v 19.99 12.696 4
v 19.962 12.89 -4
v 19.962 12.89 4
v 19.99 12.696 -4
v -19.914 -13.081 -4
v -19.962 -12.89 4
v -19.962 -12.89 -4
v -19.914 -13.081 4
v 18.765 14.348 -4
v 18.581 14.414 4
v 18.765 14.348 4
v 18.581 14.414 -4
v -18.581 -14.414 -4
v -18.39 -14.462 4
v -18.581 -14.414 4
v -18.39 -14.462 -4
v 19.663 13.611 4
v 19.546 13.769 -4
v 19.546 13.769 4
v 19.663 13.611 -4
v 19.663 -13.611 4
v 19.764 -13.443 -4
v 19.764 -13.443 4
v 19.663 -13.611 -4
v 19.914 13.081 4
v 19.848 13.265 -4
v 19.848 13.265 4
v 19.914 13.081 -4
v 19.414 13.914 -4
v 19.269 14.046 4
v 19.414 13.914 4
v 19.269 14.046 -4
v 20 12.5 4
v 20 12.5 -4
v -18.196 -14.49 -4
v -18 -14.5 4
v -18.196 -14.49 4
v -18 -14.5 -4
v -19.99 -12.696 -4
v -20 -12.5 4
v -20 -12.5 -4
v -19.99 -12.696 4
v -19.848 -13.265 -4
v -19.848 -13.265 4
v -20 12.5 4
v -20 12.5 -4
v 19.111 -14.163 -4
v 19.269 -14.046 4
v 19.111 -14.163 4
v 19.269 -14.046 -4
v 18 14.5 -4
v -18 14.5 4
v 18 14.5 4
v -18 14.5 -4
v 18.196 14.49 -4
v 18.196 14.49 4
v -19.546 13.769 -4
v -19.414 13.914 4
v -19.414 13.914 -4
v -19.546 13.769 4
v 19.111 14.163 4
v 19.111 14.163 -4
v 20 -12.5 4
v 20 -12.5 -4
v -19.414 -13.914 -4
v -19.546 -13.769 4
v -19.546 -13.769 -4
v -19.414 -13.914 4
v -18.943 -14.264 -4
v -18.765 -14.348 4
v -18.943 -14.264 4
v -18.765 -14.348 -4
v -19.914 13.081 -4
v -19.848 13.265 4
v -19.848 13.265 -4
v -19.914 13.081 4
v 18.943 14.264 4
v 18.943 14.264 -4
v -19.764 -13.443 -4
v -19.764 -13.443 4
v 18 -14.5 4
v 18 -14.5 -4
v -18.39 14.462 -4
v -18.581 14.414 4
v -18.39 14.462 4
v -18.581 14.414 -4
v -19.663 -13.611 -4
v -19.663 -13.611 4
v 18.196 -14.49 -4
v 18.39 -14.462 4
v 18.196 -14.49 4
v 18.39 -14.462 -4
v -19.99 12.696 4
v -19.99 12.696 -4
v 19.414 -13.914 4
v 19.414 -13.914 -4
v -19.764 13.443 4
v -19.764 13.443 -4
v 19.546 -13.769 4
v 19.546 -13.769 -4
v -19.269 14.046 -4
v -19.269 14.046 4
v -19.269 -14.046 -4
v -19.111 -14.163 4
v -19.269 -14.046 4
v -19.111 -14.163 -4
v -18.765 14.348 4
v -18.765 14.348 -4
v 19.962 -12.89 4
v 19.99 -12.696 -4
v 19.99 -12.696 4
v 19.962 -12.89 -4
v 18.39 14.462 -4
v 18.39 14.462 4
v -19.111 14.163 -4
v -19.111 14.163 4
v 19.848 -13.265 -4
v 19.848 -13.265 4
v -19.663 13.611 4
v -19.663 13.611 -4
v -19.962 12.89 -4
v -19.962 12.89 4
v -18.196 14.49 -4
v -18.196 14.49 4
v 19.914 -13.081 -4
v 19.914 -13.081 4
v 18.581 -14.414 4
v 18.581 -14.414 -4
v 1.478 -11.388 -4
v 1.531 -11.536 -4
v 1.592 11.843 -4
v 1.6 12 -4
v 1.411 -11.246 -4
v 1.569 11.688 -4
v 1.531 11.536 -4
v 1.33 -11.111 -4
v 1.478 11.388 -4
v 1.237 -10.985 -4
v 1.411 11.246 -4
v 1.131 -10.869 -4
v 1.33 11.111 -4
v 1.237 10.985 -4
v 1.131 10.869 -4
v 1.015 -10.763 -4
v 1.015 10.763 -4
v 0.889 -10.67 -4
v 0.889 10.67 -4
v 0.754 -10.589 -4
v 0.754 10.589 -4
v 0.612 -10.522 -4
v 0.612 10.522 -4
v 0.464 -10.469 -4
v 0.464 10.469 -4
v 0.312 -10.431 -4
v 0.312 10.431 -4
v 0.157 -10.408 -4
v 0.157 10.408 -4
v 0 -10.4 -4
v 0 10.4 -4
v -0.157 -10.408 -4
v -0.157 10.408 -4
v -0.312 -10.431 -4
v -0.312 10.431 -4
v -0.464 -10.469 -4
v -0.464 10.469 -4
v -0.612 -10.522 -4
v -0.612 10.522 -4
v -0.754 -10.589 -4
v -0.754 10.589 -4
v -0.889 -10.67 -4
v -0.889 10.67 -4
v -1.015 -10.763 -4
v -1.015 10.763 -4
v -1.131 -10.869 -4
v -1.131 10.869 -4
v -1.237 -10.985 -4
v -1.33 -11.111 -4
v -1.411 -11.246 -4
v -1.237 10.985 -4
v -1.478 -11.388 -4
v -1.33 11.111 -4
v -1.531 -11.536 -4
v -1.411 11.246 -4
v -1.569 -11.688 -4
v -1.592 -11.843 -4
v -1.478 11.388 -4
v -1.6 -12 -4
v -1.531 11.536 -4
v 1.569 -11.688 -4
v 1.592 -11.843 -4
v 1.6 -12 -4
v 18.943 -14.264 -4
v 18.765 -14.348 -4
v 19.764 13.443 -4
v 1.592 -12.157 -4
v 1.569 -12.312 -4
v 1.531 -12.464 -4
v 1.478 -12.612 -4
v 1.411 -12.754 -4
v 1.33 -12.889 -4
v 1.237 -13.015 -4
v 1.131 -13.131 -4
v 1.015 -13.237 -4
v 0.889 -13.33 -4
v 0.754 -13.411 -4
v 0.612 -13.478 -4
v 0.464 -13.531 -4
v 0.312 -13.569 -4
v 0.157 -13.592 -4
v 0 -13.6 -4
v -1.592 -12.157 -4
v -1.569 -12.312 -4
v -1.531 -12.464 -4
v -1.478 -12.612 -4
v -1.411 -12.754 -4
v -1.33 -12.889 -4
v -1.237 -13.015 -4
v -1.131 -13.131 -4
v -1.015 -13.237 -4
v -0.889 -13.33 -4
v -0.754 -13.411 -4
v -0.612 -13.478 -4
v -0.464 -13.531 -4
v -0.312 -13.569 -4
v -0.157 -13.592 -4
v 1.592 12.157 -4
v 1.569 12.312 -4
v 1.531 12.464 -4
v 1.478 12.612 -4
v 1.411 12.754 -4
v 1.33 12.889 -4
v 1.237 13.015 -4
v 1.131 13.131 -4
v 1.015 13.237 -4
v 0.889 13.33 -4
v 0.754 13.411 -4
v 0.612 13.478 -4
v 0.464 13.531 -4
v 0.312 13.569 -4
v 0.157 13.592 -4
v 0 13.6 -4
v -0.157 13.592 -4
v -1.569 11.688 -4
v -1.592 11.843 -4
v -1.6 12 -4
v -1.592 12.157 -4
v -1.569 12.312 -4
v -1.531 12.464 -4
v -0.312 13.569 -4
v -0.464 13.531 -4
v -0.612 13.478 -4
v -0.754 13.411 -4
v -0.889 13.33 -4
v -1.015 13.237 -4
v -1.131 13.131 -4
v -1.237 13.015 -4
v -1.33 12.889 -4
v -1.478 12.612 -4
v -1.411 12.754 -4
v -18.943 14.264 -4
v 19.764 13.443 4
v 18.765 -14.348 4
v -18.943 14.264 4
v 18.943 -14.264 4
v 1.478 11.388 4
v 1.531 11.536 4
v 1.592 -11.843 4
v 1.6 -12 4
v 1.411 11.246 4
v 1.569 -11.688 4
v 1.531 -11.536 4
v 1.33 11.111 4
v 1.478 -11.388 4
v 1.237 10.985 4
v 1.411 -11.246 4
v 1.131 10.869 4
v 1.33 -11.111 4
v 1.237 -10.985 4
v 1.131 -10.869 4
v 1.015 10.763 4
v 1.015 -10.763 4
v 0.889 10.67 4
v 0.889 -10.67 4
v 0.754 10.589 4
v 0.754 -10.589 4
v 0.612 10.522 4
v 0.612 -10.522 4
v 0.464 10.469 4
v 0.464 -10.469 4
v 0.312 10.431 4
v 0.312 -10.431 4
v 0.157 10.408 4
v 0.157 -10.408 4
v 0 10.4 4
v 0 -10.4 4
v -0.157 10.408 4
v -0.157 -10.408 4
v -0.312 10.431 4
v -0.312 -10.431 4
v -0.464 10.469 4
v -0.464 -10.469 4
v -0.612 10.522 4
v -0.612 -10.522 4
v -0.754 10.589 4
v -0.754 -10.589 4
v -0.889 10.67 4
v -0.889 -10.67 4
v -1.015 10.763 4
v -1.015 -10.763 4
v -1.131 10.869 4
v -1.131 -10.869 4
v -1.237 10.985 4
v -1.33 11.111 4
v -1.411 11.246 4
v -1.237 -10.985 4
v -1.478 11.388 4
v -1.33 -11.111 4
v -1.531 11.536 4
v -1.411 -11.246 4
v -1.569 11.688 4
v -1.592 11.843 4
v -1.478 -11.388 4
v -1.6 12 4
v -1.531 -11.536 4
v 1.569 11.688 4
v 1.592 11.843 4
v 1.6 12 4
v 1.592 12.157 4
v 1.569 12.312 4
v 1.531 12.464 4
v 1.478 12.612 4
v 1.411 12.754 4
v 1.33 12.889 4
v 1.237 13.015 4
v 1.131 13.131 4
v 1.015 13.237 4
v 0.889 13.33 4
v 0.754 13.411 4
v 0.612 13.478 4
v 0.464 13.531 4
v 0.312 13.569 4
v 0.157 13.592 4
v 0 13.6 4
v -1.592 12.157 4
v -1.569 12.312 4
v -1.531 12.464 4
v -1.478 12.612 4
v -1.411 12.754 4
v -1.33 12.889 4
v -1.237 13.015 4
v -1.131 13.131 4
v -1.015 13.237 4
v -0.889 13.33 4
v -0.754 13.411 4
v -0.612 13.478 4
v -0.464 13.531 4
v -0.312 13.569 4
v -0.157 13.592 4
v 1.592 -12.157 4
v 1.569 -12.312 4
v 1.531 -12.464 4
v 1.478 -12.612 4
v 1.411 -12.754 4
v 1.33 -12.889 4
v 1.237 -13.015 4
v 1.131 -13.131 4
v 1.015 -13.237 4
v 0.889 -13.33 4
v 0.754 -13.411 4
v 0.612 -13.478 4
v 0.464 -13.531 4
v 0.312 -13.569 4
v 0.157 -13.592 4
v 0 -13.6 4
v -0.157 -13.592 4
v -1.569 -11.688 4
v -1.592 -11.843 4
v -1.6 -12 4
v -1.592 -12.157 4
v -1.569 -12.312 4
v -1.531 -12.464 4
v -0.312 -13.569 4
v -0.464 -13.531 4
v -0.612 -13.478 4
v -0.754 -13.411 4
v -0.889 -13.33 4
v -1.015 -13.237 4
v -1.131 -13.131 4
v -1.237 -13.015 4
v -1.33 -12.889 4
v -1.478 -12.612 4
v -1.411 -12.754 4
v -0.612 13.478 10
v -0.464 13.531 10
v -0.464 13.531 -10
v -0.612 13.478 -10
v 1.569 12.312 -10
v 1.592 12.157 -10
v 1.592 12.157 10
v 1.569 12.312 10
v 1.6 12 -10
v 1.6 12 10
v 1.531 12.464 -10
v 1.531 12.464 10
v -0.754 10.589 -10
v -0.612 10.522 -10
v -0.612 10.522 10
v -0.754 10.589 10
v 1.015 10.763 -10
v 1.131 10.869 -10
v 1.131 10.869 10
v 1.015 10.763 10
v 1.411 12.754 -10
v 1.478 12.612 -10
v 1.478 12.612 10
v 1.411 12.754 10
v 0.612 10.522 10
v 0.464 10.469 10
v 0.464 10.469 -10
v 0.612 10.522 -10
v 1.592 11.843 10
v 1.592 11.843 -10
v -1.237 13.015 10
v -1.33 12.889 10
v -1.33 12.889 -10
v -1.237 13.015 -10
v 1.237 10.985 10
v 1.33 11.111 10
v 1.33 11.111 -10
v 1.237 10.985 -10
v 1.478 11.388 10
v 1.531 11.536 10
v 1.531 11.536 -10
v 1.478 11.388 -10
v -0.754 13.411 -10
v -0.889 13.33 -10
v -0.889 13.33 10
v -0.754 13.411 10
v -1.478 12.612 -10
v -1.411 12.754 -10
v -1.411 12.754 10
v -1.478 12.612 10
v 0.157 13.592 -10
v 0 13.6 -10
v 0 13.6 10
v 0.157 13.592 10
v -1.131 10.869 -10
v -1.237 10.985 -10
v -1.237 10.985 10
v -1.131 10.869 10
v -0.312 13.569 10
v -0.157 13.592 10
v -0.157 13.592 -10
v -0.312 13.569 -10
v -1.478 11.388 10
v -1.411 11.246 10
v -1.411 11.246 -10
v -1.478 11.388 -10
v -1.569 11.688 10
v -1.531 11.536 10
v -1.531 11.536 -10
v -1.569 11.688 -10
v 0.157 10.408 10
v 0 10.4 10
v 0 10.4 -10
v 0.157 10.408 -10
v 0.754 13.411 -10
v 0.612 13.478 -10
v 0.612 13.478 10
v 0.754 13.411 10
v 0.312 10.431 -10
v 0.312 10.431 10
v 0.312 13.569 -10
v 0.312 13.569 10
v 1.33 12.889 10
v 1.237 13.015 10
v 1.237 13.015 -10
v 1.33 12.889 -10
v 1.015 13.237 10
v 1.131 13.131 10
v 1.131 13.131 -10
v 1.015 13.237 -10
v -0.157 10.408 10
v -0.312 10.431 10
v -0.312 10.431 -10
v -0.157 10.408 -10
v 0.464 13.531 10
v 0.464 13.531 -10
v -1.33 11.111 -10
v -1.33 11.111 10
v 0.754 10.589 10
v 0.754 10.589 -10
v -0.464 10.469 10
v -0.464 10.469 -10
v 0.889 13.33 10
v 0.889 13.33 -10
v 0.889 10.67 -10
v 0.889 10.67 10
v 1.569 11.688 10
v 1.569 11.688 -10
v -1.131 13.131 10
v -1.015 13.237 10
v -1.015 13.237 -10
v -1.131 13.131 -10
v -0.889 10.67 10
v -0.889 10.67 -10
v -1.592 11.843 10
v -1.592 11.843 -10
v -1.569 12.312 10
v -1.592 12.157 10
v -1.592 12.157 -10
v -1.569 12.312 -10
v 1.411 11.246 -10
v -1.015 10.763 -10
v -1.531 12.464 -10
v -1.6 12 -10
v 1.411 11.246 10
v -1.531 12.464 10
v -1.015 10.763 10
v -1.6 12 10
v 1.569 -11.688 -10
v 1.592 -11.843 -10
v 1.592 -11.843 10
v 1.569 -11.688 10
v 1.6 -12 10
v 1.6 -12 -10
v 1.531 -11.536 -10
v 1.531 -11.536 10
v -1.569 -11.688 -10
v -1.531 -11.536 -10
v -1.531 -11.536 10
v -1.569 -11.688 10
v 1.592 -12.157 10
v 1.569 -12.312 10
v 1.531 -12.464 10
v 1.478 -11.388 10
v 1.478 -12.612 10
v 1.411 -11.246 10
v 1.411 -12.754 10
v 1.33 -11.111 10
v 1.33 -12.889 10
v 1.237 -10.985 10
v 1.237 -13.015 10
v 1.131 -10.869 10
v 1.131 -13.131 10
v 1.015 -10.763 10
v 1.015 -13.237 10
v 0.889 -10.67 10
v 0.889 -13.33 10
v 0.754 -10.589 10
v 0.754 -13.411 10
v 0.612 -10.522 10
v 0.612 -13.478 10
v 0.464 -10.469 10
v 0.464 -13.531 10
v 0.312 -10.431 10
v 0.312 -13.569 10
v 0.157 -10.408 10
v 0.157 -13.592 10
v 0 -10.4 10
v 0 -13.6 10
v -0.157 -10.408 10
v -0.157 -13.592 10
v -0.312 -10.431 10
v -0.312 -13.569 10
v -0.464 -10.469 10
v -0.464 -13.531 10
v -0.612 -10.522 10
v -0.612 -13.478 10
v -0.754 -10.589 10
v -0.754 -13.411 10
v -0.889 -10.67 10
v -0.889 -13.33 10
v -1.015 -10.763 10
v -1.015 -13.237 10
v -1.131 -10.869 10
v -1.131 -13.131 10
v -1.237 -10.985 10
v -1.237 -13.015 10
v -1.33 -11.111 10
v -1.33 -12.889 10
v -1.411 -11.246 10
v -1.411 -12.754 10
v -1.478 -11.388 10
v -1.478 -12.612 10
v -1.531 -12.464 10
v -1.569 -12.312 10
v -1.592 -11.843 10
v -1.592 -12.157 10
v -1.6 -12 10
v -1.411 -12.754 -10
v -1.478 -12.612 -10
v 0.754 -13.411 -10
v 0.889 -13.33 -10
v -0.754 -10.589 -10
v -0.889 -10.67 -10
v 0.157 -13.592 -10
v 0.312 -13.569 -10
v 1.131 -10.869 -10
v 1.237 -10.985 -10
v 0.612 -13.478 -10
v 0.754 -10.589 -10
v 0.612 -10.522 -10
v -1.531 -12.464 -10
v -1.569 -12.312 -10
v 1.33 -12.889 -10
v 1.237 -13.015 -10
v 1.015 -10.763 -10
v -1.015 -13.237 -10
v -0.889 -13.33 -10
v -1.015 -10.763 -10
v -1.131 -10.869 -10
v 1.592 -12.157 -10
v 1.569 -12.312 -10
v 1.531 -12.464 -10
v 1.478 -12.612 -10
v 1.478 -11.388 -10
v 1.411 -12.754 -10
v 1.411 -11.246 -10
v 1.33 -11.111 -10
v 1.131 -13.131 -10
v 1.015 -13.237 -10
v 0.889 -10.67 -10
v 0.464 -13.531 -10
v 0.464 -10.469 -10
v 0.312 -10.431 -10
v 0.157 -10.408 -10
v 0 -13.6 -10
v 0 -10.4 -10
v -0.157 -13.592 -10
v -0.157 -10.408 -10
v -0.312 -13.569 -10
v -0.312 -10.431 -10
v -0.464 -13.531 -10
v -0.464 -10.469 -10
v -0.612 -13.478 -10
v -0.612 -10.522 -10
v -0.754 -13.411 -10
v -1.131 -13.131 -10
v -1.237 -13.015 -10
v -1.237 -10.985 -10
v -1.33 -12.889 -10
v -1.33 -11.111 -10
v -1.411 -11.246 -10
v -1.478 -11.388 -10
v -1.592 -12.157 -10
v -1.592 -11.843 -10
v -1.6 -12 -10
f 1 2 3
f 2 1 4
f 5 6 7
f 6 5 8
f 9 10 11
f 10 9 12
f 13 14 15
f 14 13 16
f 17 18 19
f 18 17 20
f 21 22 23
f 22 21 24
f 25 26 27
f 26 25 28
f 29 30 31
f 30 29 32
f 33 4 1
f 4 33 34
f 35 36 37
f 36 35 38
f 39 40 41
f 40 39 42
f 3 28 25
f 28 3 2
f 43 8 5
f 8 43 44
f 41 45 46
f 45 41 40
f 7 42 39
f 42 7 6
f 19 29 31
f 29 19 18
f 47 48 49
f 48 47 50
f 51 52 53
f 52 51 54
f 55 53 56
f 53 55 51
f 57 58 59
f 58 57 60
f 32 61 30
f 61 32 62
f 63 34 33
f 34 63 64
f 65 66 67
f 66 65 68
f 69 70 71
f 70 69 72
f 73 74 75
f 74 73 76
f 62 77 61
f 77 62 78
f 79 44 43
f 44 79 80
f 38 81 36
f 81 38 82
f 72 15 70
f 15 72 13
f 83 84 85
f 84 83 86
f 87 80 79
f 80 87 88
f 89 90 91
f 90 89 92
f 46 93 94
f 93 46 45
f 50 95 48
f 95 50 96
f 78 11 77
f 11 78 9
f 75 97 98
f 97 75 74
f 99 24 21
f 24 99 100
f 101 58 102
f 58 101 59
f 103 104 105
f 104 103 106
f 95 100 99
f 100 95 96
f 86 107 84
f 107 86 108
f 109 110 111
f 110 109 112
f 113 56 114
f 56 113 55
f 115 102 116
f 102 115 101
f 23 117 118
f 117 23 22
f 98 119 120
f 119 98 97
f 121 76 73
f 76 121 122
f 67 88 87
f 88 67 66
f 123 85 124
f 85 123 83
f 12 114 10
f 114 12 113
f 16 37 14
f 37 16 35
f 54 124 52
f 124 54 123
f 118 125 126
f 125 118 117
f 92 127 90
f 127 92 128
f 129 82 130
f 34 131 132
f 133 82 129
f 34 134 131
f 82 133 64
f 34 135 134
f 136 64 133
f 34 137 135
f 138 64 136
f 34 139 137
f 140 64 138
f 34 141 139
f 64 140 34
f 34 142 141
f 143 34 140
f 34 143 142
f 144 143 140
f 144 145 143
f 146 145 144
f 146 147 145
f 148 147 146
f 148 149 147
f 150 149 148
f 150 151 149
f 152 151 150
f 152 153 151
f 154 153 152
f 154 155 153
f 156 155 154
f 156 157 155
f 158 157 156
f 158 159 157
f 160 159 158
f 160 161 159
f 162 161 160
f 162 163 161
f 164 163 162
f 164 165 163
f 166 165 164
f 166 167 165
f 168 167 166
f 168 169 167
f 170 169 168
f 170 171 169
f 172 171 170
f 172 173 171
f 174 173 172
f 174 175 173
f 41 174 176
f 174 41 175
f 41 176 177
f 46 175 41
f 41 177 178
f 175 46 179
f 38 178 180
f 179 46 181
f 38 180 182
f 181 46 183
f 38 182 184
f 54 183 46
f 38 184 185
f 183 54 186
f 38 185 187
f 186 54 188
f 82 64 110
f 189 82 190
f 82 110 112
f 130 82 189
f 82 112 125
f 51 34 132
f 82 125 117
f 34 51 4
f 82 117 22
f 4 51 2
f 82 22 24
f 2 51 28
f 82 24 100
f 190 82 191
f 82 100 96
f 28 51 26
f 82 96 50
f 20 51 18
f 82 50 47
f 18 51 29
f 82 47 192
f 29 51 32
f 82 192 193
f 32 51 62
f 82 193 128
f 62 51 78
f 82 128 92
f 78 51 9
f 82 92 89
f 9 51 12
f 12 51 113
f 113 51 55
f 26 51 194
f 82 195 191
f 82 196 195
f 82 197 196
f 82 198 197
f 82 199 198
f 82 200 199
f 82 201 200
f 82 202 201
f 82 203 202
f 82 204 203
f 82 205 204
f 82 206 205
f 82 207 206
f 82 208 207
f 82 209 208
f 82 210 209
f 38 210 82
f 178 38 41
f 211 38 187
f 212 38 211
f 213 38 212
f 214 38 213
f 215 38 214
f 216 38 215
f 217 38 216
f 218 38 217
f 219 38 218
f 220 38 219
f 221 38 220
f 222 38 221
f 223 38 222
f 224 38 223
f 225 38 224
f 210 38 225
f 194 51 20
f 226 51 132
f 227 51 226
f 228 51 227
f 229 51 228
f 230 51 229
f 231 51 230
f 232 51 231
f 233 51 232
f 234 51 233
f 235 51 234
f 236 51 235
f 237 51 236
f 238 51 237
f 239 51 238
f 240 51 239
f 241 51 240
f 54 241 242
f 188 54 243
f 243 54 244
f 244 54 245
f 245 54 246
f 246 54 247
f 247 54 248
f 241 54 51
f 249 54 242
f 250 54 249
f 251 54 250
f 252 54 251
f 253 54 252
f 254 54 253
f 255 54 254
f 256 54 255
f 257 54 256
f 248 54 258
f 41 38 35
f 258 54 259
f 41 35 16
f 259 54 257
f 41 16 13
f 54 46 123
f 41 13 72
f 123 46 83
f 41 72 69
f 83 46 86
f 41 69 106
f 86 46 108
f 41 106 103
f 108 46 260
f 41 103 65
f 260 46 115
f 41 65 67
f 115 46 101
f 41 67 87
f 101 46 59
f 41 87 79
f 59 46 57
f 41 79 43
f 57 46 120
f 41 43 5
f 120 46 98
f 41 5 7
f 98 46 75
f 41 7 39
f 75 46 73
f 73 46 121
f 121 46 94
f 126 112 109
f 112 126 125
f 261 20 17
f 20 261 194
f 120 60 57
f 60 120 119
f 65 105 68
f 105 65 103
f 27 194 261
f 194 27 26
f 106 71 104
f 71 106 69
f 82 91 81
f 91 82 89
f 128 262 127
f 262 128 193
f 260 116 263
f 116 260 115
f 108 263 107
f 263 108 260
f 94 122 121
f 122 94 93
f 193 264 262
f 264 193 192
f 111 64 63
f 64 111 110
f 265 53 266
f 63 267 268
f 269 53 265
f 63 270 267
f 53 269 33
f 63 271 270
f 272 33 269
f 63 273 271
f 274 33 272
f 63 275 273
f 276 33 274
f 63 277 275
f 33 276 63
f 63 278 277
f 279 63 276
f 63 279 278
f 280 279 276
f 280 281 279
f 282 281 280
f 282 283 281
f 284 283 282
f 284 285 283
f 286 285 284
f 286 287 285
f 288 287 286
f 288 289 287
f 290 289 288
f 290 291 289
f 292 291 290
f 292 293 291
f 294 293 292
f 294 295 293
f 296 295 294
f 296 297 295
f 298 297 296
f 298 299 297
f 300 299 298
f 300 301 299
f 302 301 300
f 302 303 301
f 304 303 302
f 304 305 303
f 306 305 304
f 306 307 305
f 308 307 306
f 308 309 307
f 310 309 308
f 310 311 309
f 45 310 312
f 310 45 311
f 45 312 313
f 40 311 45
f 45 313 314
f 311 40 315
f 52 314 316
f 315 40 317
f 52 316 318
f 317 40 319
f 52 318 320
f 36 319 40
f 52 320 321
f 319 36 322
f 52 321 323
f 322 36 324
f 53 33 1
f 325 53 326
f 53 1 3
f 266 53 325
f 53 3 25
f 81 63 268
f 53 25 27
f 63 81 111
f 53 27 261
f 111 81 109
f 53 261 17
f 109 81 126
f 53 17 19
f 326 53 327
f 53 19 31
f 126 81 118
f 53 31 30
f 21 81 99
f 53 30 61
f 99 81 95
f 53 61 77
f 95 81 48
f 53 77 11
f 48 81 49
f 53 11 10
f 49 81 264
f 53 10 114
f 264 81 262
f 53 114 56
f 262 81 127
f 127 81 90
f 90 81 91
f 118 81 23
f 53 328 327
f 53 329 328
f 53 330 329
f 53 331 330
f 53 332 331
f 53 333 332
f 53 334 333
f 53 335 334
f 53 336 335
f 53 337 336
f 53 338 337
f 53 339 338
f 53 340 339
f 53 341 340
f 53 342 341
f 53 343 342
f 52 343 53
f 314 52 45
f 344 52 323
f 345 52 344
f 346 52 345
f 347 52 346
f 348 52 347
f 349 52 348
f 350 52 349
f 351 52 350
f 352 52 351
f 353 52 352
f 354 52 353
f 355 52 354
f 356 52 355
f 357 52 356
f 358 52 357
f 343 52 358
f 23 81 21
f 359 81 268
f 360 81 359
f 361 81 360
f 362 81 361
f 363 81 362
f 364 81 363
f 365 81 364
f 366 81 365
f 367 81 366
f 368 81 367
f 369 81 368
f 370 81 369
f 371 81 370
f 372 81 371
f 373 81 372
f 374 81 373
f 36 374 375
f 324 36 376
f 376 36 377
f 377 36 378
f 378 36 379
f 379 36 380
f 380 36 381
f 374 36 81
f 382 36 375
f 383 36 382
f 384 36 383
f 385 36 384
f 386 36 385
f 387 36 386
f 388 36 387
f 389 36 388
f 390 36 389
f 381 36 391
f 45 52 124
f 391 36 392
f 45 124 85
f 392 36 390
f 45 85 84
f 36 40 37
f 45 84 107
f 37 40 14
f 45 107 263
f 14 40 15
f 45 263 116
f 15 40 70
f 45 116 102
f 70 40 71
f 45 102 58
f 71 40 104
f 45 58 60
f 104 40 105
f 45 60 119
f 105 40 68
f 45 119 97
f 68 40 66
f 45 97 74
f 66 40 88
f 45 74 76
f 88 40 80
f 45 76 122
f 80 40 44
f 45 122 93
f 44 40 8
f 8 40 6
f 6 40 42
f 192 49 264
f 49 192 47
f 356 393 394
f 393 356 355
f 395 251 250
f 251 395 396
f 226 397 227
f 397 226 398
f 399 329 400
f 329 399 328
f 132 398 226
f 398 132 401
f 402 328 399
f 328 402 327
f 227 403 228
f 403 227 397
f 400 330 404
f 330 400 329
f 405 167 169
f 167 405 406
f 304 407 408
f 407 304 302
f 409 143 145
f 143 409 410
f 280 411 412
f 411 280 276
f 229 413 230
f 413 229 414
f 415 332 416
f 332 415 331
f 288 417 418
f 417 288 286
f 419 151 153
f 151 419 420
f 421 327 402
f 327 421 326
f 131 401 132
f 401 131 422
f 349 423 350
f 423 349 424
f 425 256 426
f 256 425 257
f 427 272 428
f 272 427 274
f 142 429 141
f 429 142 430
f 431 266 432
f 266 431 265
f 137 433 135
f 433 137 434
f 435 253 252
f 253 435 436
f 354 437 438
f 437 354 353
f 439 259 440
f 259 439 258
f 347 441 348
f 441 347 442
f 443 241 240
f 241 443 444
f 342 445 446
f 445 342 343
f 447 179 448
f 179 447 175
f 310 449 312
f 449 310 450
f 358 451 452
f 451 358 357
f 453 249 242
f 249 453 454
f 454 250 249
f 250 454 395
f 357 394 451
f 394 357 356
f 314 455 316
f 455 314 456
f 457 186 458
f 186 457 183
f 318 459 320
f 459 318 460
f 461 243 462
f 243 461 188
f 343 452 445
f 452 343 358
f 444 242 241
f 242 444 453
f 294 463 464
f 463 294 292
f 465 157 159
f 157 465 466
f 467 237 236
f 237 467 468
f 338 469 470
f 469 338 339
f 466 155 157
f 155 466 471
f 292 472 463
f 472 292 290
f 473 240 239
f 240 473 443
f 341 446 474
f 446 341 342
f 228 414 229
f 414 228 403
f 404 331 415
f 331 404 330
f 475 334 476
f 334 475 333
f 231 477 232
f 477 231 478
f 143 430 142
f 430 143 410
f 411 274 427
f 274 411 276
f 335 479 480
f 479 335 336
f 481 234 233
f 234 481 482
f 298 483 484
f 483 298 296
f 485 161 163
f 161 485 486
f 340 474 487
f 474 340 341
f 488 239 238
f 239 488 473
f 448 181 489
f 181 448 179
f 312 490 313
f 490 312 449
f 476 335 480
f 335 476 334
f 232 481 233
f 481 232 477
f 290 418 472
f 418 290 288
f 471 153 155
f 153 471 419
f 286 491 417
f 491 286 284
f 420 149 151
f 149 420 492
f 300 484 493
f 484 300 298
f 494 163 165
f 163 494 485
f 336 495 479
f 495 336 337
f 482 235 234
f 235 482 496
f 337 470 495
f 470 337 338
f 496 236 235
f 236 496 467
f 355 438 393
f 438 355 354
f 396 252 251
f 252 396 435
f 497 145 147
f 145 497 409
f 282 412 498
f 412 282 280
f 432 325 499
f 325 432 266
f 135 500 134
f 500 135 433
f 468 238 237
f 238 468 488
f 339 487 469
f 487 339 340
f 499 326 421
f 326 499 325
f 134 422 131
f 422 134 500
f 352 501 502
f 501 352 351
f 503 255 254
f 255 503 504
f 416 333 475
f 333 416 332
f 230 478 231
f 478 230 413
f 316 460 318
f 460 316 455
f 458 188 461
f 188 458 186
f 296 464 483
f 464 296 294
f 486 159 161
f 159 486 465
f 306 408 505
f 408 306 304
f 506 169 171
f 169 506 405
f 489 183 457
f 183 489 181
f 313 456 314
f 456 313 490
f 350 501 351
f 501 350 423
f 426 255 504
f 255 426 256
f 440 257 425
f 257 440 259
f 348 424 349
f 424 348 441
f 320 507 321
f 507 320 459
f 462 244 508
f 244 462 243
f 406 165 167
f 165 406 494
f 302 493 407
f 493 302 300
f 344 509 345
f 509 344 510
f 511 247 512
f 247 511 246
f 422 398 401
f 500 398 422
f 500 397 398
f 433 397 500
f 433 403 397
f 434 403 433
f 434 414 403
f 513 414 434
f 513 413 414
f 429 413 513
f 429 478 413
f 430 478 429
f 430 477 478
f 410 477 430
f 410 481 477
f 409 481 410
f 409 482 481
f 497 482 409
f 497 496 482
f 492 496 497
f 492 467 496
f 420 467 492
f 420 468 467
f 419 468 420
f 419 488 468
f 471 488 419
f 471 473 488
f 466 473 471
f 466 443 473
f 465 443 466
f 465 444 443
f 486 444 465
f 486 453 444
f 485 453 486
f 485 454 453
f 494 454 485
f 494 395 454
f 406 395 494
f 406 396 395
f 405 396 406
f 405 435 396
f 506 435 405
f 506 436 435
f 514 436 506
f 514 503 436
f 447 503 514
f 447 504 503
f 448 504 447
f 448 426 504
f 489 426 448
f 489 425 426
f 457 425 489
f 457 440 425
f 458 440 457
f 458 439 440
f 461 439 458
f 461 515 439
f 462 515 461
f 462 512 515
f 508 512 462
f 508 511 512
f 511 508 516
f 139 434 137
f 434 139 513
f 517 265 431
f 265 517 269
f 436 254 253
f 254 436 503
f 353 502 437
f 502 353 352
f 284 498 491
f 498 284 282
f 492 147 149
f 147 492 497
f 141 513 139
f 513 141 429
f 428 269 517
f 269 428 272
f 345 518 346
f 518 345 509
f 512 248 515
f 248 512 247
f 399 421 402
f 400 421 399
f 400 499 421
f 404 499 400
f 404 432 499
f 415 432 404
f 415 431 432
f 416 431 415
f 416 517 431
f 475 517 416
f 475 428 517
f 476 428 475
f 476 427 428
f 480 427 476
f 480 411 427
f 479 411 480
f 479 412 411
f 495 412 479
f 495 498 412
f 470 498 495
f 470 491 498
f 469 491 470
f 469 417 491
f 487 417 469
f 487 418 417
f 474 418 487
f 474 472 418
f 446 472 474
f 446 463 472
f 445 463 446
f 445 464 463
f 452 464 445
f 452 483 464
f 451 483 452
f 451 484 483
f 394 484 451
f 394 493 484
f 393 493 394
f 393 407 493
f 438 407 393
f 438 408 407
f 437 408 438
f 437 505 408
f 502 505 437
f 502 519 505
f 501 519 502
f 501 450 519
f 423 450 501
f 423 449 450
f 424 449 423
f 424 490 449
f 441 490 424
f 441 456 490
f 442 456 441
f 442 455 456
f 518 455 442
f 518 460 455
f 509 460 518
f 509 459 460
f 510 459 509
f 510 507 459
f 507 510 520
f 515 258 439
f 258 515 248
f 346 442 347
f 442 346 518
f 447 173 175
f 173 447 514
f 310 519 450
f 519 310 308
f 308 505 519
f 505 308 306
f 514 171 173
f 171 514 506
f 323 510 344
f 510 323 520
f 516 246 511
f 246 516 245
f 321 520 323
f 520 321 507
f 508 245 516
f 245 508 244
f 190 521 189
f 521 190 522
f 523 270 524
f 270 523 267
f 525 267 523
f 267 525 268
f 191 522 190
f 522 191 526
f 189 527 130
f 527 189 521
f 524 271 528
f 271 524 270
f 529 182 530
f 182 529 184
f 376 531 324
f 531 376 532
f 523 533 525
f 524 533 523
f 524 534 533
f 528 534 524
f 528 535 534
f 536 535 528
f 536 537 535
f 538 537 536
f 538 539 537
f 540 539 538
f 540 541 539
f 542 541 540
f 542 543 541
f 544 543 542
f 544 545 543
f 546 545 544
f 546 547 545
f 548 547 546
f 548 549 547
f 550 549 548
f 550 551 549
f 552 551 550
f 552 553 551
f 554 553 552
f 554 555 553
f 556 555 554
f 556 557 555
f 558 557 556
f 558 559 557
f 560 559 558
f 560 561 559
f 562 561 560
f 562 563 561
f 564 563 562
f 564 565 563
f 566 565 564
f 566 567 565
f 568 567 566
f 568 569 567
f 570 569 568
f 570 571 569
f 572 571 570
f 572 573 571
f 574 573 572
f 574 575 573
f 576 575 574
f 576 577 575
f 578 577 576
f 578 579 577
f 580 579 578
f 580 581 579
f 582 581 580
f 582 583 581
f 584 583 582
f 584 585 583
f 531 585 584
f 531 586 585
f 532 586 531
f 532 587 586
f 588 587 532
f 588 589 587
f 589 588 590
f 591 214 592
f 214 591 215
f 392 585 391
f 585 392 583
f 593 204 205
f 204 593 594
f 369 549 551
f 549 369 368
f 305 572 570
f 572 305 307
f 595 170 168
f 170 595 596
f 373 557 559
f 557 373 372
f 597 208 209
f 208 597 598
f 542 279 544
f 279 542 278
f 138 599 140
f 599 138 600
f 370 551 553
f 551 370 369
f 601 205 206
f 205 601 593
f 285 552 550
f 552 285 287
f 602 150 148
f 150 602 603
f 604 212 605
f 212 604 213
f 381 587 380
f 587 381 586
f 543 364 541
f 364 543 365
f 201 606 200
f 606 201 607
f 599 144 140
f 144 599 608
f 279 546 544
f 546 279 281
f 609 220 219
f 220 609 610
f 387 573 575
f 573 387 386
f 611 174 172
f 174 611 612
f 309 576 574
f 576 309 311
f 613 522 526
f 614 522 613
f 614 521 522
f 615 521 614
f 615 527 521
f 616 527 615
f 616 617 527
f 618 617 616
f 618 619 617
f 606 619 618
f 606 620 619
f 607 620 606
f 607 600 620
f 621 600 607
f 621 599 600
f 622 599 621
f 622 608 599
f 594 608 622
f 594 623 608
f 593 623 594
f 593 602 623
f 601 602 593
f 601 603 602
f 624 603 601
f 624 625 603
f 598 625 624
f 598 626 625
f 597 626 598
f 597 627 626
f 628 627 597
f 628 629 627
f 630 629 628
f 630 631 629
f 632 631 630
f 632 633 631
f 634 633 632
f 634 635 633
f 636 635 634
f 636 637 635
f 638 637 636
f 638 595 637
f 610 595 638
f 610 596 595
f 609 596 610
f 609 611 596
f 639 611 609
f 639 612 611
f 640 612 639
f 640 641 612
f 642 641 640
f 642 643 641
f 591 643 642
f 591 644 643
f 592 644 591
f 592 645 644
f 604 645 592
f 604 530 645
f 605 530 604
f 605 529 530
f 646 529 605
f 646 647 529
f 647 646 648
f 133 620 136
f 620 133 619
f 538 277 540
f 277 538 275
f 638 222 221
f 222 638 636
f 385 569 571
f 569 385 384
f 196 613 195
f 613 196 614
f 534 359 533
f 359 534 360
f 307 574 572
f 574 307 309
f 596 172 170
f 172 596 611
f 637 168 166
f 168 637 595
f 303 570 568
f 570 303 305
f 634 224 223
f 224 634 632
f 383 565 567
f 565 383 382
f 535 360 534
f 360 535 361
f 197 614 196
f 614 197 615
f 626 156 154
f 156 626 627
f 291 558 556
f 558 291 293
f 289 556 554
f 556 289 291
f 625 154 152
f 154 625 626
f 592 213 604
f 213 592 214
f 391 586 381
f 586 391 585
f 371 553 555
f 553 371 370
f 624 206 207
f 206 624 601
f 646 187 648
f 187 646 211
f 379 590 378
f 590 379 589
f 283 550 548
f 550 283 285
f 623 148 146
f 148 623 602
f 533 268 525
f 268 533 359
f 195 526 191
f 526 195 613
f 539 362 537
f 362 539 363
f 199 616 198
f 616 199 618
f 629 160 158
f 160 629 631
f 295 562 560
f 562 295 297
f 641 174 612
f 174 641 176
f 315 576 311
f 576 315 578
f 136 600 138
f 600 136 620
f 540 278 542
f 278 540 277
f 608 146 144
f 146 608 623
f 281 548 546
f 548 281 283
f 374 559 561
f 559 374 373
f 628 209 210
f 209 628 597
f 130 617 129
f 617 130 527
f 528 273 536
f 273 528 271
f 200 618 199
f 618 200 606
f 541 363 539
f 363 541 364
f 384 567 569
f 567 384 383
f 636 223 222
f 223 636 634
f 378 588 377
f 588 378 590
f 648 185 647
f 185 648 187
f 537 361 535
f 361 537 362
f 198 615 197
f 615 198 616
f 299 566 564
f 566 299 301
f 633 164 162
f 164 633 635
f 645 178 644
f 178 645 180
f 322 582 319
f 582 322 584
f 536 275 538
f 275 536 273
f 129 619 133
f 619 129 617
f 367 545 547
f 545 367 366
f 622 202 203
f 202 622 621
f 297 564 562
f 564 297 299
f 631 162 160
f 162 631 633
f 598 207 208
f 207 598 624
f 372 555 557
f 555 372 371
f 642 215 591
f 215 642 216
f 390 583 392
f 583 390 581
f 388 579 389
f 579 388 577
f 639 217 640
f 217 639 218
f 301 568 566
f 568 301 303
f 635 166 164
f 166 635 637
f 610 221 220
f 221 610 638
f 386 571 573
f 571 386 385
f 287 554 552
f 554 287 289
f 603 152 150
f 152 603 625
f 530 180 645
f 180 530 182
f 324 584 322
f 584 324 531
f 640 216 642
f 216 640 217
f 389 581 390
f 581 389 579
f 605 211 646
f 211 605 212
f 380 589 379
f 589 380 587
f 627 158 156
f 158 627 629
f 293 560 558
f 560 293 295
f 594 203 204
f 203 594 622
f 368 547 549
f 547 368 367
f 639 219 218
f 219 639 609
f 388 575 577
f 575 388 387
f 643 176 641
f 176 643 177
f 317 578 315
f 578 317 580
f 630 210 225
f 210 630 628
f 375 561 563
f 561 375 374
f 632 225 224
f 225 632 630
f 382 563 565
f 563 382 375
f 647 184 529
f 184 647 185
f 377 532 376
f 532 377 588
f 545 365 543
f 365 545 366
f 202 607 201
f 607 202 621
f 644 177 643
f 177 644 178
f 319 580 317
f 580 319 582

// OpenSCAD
$fn=64;

module rounded_rect_2d(w, h, r){
    r2 = min(r, min(w,h)/2);
    hull(){
        translate([ w/2 - r2,  h/2 - r2]) circle(r=r2);
        translate([-w/2 + r2,  h/2 - r2]) circle(r=r2);
        translate([-w/2 + r2, -h/2 + r2]) circle(r=r2);
        translate([ w/2 - r2, -h/2 + r2]) circle(r=r2);
    }
}

module panel_cutout(w=40.0, h=29.0, r=2.0, t=6.0){
    linear_extrude(height=t, center=true)
        rounded_rect_2d(w,h,r);
}

module screw_hole(d=3.2, t=20){
    cylinder(d=d, h=t, center=true);
}

module iec_inlet_module(){
    // Panel cutout volume (for subtracting from a panel)
    panel_cutout(40.0, 29.0, 2.0, 8.0);

    // Add typical mounting holes (for reference/optional subtraction)
    // Centers approximated for common 40x29 IEC filtered inlets
    translate([0,  12.0, 0]) screw_hole(3.2, 20);
    translate([0, -12.0, 0]) screw_hole(3.2, 20);
}

iec_inlet_module();
